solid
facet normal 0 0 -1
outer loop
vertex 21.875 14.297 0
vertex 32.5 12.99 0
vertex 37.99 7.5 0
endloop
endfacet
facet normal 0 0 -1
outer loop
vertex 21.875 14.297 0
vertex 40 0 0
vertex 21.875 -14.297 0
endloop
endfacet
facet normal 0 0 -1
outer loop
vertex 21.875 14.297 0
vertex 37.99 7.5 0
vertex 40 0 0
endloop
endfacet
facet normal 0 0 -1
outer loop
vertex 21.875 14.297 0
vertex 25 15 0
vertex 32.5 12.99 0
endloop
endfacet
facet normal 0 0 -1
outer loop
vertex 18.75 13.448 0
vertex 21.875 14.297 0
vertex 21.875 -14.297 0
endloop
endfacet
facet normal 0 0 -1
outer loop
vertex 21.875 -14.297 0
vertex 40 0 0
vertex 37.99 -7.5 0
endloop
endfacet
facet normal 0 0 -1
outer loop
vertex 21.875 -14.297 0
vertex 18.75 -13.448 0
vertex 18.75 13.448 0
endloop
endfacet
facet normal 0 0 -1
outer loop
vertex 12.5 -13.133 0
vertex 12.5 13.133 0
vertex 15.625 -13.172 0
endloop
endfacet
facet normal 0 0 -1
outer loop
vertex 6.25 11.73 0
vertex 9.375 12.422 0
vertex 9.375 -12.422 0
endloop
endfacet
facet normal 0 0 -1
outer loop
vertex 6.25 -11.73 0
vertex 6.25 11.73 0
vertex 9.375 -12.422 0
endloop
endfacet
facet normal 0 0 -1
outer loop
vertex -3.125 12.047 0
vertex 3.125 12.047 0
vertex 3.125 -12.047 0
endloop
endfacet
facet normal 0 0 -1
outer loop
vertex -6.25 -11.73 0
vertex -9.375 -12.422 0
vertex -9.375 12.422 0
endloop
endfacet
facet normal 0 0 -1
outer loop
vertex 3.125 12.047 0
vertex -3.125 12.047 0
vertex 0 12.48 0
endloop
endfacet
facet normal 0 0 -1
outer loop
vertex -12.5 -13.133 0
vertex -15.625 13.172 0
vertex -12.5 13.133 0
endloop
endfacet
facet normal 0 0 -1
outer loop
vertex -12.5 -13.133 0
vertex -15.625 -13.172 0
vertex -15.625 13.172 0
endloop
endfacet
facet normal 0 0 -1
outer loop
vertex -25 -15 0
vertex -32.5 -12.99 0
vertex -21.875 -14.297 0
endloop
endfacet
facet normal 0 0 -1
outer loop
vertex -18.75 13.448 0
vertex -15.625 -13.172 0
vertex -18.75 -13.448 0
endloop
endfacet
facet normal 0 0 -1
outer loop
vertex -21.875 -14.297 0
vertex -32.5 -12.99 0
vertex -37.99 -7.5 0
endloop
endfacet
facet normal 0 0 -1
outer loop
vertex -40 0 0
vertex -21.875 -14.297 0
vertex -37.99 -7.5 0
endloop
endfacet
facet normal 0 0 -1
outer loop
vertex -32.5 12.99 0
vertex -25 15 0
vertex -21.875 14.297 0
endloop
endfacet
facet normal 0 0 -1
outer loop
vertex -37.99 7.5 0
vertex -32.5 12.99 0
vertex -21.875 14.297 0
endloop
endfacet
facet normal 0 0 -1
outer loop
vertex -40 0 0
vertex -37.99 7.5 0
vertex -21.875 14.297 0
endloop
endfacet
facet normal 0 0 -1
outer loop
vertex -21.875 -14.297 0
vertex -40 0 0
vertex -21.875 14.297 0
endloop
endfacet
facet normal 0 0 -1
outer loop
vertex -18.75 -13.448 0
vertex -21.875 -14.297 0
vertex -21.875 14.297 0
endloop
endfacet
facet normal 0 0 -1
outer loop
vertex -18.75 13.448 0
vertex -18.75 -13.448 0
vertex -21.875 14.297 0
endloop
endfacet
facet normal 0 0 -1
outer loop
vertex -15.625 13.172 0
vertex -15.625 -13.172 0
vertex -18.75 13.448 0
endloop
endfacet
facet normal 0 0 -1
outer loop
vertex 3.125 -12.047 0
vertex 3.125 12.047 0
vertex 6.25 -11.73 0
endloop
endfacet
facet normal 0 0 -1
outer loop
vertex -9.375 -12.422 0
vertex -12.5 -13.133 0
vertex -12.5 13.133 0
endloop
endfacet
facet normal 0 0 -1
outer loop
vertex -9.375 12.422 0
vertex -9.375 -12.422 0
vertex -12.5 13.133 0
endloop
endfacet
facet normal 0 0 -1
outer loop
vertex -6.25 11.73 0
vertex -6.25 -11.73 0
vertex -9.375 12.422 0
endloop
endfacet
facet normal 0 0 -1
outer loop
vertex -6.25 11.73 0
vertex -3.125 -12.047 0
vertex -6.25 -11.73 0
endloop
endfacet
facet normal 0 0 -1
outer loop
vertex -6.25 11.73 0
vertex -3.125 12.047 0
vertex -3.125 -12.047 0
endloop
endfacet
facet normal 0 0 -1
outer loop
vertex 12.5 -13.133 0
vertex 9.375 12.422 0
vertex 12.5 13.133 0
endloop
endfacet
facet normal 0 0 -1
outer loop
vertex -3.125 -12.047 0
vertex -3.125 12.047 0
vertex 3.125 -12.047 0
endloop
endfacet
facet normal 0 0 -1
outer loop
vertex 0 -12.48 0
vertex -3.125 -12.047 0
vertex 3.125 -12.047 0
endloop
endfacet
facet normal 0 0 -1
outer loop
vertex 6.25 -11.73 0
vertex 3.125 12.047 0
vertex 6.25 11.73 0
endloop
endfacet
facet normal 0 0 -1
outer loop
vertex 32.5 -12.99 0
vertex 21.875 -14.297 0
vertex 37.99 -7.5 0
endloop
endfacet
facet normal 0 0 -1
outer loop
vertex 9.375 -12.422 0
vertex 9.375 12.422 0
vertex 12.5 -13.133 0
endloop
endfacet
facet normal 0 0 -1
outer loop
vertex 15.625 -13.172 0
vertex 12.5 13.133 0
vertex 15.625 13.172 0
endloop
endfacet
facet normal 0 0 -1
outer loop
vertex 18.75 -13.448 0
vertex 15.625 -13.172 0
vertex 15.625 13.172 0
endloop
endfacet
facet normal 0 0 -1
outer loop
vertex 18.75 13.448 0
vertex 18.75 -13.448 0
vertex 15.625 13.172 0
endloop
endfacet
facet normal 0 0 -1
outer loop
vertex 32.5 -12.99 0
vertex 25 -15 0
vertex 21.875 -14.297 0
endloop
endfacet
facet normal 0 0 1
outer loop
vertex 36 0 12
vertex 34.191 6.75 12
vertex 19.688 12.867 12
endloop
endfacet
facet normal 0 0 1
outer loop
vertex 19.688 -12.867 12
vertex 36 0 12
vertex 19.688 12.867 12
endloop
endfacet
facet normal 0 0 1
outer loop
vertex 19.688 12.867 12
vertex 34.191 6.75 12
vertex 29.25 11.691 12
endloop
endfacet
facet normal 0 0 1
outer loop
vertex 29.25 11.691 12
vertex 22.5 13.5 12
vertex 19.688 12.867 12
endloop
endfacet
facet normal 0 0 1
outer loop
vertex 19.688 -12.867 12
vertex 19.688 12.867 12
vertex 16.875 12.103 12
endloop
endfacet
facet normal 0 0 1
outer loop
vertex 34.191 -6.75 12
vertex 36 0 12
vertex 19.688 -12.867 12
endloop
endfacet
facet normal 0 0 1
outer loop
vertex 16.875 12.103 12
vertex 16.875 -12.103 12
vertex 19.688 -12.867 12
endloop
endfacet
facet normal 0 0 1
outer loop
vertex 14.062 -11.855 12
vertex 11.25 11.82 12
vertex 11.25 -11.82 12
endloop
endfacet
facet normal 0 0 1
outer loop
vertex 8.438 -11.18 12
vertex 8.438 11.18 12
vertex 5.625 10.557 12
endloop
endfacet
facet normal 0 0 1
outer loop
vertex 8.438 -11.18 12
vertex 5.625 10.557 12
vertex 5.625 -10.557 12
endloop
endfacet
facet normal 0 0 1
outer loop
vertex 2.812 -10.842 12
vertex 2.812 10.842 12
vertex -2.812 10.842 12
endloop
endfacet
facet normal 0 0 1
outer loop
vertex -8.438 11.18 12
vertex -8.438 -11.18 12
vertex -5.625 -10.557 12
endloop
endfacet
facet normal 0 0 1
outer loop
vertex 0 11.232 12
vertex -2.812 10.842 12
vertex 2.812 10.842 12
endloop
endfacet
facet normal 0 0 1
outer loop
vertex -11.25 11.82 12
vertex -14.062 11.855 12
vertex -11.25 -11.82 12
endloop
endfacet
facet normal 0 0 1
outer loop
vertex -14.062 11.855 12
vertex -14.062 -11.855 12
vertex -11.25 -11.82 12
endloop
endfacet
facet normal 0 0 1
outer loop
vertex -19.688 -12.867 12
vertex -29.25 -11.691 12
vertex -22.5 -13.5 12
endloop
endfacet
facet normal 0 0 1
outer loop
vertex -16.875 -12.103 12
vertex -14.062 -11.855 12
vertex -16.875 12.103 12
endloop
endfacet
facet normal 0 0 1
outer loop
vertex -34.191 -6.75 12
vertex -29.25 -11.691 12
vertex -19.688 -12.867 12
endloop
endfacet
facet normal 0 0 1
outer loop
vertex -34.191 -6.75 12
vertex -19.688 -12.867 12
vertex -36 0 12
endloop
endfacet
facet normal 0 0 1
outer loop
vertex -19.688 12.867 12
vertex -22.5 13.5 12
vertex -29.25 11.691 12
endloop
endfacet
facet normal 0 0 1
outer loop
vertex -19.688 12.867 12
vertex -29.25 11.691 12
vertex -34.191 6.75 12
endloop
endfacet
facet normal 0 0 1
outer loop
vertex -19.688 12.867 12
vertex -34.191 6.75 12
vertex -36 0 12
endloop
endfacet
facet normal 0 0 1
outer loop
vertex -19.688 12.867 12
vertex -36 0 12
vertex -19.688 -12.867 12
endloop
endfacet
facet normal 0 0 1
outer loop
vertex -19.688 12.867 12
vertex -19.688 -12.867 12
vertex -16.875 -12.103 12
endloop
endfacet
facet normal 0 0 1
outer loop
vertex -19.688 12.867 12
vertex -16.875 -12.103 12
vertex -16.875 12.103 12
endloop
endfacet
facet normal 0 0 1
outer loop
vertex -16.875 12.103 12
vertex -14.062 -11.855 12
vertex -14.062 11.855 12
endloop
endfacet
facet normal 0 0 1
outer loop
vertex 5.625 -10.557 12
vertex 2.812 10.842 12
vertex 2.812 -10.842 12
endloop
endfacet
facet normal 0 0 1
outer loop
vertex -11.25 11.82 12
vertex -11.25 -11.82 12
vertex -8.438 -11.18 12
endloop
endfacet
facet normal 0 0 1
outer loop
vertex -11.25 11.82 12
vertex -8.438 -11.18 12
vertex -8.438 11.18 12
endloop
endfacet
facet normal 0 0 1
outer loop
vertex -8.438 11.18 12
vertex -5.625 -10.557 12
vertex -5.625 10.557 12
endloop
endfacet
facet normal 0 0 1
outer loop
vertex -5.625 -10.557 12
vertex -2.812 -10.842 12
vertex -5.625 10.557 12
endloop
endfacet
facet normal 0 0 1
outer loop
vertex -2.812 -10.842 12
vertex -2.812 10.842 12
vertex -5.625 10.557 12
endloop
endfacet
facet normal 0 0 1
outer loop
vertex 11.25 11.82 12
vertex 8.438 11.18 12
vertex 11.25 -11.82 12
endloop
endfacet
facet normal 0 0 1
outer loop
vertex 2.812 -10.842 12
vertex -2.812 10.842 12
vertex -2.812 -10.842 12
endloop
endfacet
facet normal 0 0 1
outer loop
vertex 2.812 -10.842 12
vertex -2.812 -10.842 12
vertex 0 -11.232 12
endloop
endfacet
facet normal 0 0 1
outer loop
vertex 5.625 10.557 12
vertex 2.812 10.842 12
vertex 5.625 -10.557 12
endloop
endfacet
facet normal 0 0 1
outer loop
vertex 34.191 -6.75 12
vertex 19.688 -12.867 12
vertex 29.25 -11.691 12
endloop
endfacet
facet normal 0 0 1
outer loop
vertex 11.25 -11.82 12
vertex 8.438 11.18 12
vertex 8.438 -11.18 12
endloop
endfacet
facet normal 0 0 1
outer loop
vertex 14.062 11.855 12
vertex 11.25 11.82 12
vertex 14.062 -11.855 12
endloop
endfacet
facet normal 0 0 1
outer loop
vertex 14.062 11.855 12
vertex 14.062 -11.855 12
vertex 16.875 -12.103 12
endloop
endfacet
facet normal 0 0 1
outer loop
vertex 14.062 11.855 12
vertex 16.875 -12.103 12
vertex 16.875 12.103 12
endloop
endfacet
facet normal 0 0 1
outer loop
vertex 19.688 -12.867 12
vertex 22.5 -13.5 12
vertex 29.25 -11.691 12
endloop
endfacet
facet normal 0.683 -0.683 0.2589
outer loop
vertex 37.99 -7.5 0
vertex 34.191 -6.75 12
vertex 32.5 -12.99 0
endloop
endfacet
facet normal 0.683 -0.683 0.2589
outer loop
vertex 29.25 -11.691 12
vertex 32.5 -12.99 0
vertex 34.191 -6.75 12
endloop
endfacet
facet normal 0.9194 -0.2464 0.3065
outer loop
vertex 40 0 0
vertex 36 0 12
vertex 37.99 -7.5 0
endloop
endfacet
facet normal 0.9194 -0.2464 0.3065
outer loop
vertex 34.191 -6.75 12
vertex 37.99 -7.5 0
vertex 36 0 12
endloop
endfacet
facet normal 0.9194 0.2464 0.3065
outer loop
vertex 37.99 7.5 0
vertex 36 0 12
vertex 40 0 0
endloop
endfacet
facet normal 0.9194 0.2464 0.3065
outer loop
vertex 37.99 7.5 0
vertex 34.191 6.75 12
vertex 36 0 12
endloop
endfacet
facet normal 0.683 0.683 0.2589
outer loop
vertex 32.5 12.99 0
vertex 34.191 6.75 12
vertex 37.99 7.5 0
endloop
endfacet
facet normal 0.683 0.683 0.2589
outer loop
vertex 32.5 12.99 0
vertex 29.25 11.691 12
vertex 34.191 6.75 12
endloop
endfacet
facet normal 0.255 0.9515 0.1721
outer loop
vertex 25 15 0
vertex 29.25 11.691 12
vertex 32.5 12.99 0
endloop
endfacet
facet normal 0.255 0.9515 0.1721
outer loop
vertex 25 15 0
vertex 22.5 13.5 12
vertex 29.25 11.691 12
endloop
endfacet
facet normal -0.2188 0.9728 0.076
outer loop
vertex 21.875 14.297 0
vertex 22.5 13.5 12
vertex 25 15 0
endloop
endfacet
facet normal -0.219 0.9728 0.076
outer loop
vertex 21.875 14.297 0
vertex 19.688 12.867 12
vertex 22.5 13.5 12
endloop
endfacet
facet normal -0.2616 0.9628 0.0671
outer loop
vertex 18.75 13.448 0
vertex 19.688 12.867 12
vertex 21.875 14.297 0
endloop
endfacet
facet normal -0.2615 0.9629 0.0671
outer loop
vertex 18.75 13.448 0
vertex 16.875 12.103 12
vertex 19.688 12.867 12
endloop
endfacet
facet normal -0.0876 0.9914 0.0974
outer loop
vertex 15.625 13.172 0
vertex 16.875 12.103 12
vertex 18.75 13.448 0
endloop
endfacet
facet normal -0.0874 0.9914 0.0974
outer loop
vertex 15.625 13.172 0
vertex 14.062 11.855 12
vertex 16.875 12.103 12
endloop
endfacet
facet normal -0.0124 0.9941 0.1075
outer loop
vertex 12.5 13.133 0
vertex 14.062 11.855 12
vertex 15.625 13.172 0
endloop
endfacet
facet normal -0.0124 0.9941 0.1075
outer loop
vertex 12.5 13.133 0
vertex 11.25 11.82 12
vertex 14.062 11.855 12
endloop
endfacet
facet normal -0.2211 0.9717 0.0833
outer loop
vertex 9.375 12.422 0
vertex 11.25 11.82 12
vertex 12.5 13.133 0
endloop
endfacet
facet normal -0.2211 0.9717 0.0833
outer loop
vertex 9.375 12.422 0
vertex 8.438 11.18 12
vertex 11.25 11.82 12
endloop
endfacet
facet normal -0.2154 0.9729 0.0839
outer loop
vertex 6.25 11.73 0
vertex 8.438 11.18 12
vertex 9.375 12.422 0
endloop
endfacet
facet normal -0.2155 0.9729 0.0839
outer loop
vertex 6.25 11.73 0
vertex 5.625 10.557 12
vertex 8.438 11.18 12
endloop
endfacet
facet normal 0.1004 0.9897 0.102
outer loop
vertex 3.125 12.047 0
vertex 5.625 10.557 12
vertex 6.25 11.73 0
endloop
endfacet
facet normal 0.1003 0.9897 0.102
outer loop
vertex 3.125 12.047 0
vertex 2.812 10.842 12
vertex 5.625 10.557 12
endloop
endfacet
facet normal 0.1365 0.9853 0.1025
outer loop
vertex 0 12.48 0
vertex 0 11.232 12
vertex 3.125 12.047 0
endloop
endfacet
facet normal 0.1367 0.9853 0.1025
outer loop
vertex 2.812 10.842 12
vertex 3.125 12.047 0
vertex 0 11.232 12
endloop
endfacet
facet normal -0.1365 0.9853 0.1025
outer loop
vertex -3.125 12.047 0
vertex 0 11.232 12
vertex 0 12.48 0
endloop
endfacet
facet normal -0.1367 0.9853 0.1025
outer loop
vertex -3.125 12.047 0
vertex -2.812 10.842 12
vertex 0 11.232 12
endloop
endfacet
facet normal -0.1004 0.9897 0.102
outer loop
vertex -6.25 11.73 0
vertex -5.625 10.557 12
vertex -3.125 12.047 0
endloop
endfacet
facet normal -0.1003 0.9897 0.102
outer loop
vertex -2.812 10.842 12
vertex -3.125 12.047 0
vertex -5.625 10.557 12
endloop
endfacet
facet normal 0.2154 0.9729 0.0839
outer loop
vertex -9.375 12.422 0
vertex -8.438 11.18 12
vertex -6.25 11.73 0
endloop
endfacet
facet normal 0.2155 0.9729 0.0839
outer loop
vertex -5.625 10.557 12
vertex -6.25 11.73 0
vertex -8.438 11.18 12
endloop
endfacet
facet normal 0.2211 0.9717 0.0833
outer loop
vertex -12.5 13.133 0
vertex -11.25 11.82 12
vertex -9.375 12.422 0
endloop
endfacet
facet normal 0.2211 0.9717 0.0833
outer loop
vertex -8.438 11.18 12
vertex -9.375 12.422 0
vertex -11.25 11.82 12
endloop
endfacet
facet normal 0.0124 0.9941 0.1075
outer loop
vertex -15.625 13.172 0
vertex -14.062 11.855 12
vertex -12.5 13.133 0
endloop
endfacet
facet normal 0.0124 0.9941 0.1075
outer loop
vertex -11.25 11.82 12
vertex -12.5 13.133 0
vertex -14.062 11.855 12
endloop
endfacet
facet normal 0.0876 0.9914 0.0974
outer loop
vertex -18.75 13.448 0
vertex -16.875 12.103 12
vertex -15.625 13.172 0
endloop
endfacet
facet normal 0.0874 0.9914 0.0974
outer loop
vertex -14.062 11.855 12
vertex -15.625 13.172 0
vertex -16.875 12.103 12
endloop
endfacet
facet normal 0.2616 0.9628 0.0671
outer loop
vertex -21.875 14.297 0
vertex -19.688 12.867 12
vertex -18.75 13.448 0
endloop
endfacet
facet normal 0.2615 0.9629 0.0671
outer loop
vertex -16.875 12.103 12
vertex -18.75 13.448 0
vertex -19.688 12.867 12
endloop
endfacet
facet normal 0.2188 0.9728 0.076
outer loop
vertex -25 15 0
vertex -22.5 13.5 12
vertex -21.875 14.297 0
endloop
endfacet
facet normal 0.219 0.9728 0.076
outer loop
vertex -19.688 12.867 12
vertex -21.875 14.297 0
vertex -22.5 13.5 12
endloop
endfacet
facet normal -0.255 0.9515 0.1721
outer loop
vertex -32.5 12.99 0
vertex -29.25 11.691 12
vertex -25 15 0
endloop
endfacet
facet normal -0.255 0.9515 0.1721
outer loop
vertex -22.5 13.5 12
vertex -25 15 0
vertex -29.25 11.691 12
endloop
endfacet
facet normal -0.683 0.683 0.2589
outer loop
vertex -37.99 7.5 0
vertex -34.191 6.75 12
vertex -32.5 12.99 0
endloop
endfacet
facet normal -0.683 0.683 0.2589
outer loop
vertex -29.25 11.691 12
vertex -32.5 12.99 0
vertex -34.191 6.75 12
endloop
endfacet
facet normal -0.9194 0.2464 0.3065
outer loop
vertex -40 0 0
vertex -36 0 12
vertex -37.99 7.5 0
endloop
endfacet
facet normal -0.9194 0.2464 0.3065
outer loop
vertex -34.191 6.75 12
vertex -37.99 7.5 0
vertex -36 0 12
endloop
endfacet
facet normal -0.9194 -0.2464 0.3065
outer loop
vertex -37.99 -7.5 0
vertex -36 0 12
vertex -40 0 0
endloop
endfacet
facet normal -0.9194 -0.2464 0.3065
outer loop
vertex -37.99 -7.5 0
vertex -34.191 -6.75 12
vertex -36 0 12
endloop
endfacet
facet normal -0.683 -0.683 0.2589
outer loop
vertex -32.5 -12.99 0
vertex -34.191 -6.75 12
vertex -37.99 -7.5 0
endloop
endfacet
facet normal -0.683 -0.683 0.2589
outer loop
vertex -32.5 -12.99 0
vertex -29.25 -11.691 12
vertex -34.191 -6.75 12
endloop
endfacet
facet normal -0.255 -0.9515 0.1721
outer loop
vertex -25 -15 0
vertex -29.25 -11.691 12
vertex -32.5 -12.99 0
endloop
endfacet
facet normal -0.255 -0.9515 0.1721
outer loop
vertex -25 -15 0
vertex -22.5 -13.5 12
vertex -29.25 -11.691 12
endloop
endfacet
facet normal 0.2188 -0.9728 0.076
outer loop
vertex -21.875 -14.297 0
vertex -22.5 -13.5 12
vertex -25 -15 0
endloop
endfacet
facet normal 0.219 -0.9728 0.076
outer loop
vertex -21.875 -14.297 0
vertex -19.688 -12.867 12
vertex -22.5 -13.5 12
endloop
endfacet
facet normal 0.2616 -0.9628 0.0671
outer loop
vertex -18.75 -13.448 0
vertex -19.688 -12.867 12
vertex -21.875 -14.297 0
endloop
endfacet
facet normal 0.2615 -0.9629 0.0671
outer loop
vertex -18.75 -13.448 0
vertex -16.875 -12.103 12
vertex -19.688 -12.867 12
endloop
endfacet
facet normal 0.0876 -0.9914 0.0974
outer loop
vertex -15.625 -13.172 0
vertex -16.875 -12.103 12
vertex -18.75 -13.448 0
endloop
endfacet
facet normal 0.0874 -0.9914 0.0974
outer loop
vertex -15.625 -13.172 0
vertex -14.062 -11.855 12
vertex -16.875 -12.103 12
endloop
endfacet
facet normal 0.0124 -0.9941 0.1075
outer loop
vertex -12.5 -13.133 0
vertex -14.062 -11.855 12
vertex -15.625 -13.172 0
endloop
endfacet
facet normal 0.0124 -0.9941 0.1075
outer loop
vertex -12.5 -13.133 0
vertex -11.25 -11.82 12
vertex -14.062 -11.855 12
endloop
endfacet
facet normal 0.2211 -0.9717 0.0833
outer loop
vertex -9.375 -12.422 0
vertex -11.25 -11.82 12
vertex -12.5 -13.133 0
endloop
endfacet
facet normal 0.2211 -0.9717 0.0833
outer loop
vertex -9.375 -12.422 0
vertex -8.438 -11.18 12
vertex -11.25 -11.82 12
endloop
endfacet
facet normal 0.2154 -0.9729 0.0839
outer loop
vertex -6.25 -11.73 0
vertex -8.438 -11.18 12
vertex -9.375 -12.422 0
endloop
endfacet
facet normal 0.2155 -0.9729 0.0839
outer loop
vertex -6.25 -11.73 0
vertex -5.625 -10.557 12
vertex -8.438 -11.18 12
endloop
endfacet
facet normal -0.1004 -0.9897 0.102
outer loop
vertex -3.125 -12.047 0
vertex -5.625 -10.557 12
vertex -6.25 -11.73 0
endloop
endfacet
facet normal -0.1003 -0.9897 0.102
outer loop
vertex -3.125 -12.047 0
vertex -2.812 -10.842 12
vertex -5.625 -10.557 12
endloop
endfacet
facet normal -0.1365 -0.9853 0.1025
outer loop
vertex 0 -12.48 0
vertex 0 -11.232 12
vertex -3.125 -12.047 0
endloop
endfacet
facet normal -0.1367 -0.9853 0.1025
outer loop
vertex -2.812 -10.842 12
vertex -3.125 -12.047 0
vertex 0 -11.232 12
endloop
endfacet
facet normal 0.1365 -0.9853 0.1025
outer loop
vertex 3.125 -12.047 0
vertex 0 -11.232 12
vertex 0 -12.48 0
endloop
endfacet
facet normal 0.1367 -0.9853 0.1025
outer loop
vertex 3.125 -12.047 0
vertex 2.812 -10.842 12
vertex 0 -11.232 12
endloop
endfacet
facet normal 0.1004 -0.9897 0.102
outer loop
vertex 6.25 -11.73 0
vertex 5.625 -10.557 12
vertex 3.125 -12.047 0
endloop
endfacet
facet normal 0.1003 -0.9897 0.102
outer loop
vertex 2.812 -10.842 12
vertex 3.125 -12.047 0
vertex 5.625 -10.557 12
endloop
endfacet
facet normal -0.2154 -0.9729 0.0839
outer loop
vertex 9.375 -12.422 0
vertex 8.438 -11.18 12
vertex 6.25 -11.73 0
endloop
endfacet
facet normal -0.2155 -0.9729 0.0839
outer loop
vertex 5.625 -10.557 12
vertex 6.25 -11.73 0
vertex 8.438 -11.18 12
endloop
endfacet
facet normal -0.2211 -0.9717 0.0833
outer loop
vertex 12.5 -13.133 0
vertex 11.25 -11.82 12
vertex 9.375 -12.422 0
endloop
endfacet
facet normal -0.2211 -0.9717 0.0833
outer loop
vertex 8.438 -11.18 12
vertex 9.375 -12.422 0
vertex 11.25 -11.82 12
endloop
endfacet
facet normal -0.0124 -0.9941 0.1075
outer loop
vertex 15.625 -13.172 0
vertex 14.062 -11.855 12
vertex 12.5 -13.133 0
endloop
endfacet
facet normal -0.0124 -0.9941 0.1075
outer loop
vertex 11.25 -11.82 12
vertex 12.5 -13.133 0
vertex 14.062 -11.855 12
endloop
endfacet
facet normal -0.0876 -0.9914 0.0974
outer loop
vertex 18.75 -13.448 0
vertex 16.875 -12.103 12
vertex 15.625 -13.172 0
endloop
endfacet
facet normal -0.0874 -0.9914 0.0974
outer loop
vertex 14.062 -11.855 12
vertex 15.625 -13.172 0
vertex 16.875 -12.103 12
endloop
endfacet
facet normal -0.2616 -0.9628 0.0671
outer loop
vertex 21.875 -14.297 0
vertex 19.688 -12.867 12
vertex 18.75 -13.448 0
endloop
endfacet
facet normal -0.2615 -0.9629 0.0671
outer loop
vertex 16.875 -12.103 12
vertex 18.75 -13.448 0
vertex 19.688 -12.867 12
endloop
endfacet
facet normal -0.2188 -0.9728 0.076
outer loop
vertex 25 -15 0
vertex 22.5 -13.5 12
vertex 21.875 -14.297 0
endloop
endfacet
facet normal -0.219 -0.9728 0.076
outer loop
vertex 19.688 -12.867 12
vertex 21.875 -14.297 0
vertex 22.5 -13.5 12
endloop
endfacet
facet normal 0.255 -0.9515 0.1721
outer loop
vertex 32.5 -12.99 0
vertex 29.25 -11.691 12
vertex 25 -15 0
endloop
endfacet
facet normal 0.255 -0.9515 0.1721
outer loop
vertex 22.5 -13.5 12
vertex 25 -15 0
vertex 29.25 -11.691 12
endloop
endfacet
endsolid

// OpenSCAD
$fn = 32;

// ----------------------------------------------------------------------
// Handle: 80 x 30 mm grip, 12 mm thick
// ----------------------------------------------------------------------

// --- parameters (mm) ---
length = 80;              // grip length
width = 30;               // grip width
thickness = 12;           // grip thickness
waist = 0.8;              // width factor at the middle
draft = 0.9;              // top face scale of the extrusion
scallops = 4;             // finger rests per side
ripple = 0.04;            // depth factor of the finger rests

/* ergonomic grip outline, closed spline-like polygon in the XY plane */
grip = [[-25, 15], [-21.875, 14.297], [-18.75, 13.448], [-15.625, 13.172], [-12.5, 13.133], [-9.375, 12.422], [-6.25, 11.73], [-3.125, 12.047], [0, 12.48], [3.125, 12.047], [6.25, 11.73], [9.375, 12.422], [12.5, 13.133], [15.625, 13.172], [18.75, 13.448], [21.875, 14.297], [25, 15], [32.5, 12.99], [37.99, 7.5], [40, 0], [37.99, -7.5], [32.5, -12.99], [25, -15], [25, -15], [21.875, -14.297], [18.75, -13.448], [15.625, -13.172], [12.5, -13.133], [9.375, -12.422], [6.25, -11.73], [3.125, -12.047], [0, -12.48], [-3.125, -12.047], [-6.25, -11.73], [-9.375, -12.422], [-12.5, -13.133], [-15.625, -13.172], [-18.75, -13.448], [-21.875, -14.297], [-25, -15], [-32.5, -12.99], [-37.99, -7.5], [-40, 0], [-37.99, 7.5], [-32.5, 12.99], [-25, 15]];

module grip_body() {
  linear_extrude(height = thickness, scale = draft) polygon(grip);
}

difference() {
  union() {
    grip_body();
  }
}
